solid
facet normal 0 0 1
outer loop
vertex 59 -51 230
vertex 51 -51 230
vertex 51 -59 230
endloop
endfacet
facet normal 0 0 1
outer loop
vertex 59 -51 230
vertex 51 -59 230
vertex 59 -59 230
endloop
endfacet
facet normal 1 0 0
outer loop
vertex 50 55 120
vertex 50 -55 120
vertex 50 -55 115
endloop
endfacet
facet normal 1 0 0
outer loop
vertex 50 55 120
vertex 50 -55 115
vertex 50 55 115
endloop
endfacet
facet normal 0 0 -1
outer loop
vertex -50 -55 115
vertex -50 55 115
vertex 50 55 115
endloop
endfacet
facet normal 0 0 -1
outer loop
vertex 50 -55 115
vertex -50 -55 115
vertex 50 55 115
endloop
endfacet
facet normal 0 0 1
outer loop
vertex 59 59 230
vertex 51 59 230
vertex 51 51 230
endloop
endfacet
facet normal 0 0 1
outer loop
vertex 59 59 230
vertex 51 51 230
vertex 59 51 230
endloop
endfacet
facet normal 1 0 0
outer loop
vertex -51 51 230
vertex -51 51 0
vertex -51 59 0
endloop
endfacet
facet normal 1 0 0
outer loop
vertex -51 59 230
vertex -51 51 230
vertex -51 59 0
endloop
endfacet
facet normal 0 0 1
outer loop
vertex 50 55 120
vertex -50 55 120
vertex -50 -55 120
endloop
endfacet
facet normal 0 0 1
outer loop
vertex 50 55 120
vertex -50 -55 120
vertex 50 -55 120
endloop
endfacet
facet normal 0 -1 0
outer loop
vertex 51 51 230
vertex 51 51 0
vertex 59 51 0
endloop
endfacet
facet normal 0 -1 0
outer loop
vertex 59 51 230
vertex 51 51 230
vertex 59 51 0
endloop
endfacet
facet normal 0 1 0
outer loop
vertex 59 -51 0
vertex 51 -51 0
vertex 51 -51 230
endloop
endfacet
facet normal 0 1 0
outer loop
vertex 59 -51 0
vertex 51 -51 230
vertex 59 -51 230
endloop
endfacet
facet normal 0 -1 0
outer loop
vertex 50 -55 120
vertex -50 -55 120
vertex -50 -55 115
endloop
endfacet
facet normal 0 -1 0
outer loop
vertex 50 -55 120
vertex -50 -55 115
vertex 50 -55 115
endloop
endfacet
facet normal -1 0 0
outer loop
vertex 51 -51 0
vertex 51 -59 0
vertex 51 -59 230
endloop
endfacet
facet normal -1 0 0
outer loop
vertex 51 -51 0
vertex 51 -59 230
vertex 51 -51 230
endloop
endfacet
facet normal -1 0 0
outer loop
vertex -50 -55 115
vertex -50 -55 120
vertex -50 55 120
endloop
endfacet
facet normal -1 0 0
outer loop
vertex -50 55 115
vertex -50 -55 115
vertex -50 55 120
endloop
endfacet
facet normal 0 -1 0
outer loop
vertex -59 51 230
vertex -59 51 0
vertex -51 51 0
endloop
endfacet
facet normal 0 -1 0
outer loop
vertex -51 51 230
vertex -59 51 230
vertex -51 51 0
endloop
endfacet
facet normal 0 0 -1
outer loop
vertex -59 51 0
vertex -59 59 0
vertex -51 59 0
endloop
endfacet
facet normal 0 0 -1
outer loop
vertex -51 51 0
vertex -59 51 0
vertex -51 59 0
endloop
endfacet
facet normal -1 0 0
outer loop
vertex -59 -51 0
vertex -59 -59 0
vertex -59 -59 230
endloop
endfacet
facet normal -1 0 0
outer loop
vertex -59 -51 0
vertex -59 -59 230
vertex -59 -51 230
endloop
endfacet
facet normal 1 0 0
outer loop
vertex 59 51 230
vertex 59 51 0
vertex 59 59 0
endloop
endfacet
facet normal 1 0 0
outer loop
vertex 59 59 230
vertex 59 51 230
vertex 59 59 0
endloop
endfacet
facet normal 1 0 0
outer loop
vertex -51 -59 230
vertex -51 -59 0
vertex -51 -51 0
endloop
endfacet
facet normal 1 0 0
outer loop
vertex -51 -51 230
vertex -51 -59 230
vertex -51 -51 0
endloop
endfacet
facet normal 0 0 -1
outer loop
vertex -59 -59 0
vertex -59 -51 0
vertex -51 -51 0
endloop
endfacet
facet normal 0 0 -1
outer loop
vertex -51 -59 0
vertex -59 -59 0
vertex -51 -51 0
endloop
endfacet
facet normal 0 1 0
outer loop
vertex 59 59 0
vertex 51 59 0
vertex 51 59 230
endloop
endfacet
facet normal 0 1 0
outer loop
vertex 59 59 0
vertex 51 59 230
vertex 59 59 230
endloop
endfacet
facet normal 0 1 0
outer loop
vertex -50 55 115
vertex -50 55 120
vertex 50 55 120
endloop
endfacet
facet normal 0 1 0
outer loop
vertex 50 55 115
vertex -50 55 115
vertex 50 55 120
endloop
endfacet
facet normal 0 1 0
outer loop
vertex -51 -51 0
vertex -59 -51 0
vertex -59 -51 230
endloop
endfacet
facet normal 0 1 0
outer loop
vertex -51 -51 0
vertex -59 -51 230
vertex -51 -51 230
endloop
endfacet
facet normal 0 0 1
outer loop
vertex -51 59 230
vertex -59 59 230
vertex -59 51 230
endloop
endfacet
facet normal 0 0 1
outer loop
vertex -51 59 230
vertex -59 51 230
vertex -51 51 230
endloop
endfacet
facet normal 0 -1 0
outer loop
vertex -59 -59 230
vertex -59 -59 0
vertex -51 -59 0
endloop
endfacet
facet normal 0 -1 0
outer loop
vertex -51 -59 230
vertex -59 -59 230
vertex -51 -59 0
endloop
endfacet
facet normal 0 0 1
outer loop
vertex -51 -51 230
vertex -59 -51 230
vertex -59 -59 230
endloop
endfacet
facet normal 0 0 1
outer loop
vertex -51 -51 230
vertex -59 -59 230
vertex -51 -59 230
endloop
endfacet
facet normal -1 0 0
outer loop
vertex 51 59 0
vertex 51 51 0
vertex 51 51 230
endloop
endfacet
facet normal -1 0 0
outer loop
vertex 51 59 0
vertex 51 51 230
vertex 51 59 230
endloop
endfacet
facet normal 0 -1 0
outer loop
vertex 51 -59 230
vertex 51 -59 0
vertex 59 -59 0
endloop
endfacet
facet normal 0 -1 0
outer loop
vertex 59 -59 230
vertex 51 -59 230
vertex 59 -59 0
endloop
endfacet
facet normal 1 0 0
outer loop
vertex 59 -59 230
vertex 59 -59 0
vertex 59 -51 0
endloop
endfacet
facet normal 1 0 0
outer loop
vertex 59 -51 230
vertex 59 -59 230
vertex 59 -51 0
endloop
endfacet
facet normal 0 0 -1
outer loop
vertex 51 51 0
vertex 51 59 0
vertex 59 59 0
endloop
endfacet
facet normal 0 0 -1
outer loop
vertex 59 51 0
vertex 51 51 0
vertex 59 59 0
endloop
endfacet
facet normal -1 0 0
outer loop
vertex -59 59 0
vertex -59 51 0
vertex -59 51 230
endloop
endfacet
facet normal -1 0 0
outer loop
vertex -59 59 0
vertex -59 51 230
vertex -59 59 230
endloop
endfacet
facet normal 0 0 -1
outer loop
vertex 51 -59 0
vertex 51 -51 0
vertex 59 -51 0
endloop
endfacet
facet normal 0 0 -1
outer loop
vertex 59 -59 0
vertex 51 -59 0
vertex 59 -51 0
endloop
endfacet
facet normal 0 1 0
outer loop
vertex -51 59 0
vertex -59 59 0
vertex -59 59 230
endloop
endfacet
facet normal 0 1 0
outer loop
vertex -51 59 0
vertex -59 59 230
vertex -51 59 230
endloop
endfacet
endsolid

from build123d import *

# Parameters (mm, degrees)
F0_W     = 8
F0_H     = 8
F1_DEPTH = 230
F3_W     = 100
F3_H     = 110
F4_DEPTH = 5


# Not quite as in the source:
# - the program builds the solid bodies; features that only make, move or delete a surface that nothing else refers to are left out


with BuildPart() as f1:
    # F0 (on Top) → F1 (new body)
    with BuildSketch(Plane.XY):
        with Locations((-55, 55)):
            Rectangle(F0_W, F0_H)
    extrude(amount=F1_DEPTH)


with BuildPart() as f1b:
    # F0 (on Top) → F1, piece 2 (new body)
    with BuildSketch(Plane.XY):
        with Locations((-55, -55)):
            Rectangle(F0_W, F0_H)
    extrude(amount=F1_DEPTH)


with BuildPart() as f1c:
    # F0 (on Top) → F1, piece 3 (new body)
    with BuildSketch(Plane.XY):
        with Locations((55, 55)):
            Rectangle(F0_W, F0_H)
    extrude(amount=F1_DEPTH)


with BuildPart() as f1d:
    # F0 (on Top) → F1, piece 4 (new body)
    with BuildSketch(Plane.XY):
        with Locations((55, -55)):
            Rectangle(F0_W, F0_H)
    extrude(amount=F1_DEPTH)


with BuildPart() as f4:
    # F3 (on offset) → F4 (new body)
    with BuildSketch(Plane.XY.offset(120)):
        Rectangle(F3_W, F3_H)
    extrude(amount=-F4_DEPTH)


solid = Compound([f1.part, f1b.part, f1c.part, f1d.part, f4.part])
